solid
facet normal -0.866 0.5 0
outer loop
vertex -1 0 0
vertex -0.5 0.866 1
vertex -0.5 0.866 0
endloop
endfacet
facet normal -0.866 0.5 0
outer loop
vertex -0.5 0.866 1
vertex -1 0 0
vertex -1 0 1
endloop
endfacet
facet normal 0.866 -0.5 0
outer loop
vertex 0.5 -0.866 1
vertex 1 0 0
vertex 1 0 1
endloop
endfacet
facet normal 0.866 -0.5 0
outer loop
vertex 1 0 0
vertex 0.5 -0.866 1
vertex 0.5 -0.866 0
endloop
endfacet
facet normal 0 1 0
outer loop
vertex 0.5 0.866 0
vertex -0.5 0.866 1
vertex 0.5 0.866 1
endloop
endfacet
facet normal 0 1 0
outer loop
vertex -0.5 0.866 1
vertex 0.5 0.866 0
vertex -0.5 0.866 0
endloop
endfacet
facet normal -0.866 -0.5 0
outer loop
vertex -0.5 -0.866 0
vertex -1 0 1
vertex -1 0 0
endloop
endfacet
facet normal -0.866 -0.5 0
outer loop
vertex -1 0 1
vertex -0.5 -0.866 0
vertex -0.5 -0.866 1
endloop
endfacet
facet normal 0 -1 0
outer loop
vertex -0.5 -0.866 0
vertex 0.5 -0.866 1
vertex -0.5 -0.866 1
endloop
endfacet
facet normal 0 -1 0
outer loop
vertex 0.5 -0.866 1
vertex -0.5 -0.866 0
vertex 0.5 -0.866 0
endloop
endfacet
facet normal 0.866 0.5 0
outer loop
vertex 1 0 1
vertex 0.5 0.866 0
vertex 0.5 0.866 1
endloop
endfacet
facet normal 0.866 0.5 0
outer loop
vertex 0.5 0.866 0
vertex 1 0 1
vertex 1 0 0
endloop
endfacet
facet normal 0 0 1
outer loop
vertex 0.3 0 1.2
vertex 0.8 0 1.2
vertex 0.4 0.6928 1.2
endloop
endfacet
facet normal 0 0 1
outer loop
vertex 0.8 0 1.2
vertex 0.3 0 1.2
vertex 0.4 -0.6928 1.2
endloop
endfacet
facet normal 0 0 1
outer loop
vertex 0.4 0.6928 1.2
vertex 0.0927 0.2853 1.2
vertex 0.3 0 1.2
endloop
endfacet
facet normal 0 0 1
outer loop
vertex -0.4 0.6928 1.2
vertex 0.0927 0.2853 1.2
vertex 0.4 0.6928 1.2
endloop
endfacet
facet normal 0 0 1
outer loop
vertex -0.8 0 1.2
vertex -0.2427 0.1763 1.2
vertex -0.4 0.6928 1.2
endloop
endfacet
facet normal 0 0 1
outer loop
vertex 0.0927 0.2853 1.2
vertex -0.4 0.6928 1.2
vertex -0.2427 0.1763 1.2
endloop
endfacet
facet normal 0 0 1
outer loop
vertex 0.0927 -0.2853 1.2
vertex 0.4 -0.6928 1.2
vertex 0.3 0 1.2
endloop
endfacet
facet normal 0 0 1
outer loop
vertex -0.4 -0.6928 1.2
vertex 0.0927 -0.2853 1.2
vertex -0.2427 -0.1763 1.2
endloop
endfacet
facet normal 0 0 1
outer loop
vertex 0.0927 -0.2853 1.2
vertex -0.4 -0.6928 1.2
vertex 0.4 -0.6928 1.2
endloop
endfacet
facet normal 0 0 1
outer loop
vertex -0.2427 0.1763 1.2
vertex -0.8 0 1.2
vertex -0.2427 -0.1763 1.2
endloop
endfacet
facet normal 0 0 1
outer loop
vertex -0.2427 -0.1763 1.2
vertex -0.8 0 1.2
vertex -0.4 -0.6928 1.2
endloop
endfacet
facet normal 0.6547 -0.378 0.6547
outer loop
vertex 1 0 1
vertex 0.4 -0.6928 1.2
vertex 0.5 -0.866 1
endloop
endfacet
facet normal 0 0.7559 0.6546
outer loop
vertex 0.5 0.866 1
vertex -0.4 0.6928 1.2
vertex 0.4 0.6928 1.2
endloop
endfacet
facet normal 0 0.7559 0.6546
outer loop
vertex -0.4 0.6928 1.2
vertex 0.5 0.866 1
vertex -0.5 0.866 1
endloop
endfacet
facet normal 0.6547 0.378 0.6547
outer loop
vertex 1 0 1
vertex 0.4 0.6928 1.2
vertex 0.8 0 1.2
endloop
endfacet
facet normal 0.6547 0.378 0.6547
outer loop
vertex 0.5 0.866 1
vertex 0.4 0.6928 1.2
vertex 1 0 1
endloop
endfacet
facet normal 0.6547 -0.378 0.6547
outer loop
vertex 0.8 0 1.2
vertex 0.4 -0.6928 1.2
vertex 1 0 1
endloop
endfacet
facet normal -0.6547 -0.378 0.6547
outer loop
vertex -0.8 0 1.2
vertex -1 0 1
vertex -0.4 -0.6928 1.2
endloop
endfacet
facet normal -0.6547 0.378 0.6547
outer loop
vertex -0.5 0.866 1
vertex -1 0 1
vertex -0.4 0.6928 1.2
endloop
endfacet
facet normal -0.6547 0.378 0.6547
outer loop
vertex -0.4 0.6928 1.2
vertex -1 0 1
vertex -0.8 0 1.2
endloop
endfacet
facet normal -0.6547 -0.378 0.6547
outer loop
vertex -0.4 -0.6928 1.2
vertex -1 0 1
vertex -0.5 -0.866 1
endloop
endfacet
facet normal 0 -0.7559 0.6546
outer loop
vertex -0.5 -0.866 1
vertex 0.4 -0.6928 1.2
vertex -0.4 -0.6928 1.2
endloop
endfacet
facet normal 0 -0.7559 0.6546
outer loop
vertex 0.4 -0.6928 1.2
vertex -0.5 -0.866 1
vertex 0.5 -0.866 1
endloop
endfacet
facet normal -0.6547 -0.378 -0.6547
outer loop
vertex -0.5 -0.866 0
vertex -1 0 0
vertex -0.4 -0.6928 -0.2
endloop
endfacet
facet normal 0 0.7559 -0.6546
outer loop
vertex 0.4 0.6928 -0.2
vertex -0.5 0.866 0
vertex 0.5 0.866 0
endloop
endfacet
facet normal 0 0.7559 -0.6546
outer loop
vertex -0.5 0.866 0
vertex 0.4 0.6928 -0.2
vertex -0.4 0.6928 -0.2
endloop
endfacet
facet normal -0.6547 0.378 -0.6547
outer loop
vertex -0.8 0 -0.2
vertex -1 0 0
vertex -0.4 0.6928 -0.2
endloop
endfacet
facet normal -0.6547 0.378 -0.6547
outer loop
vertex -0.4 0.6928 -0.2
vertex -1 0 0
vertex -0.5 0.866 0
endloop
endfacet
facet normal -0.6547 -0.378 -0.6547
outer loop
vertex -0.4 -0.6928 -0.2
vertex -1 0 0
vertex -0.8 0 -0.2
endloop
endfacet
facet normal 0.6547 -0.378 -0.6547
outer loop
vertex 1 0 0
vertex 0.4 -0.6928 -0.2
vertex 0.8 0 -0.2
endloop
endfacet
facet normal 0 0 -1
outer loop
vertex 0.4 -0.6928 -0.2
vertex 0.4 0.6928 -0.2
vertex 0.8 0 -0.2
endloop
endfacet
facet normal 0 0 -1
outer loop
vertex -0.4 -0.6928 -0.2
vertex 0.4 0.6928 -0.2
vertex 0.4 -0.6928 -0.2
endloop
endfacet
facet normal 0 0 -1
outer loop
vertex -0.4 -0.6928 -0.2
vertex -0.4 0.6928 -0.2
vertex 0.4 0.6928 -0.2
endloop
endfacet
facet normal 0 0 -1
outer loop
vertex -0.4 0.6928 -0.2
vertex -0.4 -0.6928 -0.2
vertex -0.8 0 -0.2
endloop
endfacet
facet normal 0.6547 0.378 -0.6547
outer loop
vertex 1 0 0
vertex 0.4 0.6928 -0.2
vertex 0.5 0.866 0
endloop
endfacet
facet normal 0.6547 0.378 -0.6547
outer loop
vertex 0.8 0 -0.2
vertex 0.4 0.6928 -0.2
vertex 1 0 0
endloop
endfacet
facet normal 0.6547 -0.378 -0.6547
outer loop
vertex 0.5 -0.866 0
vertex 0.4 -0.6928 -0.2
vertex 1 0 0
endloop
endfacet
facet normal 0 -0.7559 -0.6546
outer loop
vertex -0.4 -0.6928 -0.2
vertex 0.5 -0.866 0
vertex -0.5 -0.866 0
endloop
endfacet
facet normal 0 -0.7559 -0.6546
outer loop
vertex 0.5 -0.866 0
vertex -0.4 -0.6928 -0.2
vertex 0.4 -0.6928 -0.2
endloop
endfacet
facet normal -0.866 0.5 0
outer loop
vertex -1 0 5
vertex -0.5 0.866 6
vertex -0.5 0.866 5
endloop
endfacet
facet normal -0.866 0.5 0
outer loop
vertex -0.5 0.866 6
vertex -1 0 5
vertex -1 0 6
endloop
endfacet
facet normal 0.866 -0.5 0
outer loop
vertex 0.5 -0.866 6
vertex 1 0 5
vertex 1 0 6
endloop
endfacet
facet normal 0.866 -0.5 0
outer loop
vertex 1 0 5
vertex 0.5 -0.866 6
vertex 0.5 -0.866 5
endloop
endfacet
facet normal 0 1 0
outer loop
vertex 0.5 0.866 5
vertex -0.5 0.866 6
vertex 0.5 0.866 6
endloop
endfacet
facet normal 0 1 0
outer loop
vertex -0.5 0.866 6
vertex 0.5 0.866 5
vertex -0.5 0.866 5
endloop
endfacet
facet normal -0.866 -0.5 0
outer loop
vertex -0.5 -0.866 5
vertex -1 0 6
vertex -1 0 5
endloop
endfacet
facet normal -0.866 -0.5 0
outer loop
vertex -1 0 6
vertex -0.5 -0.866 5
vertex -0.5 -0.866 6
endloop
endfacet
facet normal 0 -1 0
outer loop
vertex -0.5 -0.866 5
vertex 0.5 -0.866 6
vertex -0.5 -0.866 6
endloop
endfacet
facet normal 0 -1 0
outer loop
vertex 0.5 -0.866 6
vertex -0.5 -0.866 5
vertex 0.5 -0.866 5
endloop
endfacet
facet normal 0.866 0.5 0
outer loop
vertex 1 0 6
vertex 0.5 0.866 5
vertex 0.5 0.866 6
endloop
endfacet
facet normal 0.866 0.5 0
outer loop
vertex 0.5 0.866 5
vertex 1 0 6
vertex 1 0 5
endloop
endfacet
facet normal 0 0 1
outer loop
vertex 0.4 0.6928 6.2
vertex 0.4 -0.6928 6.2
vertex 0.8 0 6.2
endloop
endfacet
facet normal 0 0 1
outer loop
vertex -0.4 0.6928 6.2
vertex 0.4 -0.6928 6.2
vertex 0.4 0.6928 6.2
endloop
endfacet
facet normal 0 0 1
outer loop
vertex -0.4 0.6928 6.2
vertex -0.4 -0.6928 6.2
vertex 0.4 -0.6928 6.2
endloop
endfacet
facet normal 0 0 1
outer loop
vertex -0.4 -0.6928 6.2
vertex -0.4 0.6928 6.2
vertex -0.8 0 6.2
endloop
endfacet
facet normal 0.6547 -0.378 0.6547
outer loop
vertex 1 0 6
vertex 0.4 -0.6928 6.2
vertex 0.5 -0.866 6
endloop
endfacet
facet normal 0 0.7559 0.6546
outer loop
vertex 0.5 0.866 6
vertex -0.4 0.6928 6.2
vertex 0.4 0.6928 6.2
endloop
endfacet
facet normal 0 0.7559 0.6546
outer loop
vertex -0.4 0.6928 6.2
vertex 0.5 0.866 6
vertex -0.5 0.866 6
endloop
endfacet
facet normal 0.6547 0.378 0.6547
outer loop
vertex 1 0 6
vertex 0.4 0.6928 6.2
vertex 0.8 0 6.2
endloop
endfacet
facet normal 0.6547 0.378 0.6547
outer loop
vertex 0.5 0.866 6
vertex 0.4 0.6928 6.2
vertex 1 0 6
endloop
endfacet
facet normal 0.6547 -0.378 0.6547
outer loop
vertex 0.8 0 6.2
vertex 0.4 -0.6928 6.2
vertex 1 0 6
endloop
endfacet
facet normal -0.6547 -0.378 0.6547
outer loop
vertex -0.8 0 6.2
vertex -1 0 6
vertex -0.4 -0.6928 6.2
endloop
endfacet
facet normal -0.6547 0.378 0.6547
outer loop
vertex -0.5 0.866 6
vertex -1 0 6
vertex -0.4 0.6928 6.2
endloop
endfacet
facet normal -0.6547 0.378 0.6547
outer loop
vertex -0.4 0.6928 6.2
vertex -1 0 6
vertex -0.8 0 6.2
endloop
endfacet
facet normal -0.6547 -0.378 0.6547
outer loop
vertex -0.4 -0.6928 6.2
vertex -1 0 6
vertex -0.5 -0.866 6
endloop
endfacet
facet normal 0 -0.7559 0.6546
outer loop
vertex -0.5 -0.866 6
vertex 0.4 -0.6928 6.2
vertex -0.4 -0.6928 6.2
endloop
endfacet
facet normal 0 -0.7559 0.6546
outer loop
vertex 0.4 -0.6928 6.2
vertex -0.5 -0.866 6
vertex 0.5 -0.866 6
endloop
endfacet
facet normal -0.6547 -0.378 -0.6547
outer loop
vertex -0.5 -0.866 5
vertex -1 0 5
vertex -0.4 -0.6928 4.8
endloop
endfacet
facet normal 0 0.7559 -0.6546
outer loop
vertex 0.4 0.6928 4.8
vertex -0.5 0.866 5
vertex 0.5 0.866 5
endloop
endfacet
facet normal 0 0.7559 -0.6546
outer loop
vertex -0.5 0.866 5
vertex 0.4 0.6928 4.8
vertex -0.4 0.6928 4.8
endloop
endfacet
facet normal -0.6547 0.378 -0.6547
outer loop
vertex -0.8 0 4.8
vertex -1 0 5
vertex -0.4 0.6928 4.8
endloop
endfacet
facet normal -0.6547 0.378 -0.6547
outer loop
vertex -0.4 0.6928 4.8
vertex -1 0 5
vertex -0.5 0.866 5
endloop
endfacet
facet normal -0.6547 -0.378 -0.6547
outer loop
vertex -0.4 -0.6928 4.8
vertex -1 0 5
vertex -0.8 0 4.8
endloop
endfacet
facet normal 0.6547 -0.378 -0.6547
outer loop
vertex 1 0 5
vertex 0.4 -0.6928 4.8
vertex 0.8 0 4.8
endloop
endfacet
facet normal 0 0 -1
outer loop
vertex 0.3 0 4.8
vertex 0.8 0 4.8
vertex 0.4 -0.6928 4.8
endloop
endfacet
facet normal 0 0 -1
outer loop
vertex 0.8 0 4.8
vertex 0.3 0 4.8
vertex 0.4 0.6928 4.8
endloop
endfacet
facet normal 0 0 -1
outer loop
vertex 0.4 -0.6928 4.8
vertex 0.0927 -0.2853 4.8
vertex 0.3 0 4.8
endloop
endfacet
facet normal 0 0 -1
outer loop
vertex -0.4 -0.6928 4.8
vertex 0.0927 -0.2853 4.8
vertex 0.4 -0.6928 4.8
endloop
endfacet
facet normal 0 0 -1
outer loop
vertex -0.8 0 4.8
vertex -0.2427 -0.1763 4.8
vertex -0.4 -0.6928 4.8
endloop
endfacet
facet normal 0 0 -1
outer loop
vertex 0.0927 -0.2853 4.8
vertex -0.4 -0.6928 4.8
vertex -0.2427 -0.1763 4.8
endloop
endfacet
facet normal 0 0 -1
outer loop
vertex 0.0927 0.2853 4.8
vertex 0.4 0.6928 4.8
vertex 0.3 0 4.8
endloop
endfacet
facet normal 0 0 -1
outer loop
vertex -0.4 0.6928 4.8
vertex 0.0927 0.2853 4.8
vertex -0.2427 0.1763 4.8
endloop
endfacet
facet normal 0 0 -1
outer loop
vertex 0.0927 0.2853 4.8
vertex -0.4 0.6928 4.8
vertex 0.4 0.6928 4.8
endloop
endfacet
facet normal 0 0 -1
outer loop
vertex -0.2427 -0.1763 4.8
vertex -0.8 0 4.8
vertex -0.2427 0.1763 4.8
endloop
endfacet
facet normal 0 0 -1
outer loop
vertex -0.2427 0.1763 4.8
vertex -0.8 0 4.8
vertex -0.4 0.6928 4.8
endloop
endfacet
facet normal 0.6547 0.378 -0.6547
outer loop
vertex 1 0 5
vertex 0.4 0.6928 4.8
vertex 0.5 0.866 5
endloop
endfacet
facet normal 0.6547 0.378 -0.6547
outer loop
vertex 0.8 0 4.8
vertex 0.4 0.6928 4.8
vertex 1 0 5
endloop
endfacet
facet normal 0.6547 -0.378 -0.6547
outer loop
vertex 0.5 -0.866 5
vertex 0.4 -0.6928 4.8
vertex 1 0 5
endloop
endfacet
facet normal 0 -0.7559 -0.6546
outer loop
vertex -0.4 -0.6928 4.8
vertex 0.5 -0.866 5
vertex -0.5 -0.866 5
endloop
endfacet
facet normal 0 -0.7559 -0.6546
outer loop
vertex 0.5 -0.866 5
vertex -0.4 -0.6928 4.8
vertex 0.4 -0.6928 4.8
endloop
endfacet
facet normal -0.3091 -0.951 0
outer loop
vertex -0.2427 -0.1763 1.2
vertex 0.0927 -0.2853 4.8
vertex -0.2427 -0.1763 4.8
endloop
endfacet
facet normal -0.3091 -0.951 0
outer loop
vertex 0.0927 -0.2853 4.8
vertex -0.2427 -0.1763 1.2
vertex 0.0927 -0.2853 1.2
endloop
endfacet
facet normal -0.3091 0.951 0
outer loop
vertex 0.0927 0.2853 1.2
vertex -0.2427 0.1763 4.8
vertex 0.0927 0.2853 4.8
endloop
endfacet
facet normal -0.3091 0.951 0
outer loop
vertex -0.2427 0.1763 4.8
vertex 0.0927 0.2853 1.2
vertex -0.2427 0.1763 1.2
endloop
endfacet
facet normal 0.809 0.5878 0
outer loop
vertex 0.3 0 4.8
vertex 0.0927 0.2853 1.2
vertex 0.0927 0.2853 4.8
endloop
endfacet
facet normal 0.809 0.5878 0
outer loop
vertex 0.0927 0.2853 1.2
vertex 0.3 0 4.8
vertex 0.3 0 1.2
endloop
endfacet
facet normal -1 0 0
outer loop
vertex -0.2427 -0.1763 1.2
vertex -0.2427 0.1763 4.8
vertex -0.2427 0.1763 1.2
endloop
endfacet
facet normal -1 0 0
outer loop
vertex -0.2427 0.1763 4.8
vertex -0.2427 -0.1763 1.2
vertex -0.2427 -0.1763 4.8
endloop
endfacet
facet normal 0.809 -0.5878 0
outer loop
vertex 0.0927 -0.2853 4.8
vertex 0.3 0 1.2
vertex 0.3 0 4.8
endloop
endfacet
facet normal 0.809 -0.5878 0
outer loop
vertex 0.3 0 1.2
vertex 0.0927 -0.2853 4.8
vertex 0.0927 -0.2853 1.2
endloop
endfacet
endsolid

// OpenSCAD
module Weights(){

module regular_polygon(order = 6, r=1){
     angles=[ for (i = [0:order-1]) i*(360/order) ];
     coords=[ for (th=angles) [r*cos(th), r*sin(th)] ];
     polygon(coords);
}
 
 
module weight(){ 
color("#a8b0b2")
linear_extrude(height= 1)
 regular_polygon(order = 6);
 
translate([0,0,1])
color("#a8b0b2")
linear_extrude(height= 0.2, scale = 0.8)
 regular_polygon(order = 6);
 
 
 translate([0,0,0])
 rotate([0,180,0])
color("#a8b0b2")
linear_extrude(height= 0.2, scale = 0.8)
 regular_polygon(order = 6);
 }
 
 
 
 weight(); 
 translate([0,0,5])
 weight();
 
 color("#3b3b3b")
 cylinder(5,0.3,0.3);
 
}
 
Weights();
